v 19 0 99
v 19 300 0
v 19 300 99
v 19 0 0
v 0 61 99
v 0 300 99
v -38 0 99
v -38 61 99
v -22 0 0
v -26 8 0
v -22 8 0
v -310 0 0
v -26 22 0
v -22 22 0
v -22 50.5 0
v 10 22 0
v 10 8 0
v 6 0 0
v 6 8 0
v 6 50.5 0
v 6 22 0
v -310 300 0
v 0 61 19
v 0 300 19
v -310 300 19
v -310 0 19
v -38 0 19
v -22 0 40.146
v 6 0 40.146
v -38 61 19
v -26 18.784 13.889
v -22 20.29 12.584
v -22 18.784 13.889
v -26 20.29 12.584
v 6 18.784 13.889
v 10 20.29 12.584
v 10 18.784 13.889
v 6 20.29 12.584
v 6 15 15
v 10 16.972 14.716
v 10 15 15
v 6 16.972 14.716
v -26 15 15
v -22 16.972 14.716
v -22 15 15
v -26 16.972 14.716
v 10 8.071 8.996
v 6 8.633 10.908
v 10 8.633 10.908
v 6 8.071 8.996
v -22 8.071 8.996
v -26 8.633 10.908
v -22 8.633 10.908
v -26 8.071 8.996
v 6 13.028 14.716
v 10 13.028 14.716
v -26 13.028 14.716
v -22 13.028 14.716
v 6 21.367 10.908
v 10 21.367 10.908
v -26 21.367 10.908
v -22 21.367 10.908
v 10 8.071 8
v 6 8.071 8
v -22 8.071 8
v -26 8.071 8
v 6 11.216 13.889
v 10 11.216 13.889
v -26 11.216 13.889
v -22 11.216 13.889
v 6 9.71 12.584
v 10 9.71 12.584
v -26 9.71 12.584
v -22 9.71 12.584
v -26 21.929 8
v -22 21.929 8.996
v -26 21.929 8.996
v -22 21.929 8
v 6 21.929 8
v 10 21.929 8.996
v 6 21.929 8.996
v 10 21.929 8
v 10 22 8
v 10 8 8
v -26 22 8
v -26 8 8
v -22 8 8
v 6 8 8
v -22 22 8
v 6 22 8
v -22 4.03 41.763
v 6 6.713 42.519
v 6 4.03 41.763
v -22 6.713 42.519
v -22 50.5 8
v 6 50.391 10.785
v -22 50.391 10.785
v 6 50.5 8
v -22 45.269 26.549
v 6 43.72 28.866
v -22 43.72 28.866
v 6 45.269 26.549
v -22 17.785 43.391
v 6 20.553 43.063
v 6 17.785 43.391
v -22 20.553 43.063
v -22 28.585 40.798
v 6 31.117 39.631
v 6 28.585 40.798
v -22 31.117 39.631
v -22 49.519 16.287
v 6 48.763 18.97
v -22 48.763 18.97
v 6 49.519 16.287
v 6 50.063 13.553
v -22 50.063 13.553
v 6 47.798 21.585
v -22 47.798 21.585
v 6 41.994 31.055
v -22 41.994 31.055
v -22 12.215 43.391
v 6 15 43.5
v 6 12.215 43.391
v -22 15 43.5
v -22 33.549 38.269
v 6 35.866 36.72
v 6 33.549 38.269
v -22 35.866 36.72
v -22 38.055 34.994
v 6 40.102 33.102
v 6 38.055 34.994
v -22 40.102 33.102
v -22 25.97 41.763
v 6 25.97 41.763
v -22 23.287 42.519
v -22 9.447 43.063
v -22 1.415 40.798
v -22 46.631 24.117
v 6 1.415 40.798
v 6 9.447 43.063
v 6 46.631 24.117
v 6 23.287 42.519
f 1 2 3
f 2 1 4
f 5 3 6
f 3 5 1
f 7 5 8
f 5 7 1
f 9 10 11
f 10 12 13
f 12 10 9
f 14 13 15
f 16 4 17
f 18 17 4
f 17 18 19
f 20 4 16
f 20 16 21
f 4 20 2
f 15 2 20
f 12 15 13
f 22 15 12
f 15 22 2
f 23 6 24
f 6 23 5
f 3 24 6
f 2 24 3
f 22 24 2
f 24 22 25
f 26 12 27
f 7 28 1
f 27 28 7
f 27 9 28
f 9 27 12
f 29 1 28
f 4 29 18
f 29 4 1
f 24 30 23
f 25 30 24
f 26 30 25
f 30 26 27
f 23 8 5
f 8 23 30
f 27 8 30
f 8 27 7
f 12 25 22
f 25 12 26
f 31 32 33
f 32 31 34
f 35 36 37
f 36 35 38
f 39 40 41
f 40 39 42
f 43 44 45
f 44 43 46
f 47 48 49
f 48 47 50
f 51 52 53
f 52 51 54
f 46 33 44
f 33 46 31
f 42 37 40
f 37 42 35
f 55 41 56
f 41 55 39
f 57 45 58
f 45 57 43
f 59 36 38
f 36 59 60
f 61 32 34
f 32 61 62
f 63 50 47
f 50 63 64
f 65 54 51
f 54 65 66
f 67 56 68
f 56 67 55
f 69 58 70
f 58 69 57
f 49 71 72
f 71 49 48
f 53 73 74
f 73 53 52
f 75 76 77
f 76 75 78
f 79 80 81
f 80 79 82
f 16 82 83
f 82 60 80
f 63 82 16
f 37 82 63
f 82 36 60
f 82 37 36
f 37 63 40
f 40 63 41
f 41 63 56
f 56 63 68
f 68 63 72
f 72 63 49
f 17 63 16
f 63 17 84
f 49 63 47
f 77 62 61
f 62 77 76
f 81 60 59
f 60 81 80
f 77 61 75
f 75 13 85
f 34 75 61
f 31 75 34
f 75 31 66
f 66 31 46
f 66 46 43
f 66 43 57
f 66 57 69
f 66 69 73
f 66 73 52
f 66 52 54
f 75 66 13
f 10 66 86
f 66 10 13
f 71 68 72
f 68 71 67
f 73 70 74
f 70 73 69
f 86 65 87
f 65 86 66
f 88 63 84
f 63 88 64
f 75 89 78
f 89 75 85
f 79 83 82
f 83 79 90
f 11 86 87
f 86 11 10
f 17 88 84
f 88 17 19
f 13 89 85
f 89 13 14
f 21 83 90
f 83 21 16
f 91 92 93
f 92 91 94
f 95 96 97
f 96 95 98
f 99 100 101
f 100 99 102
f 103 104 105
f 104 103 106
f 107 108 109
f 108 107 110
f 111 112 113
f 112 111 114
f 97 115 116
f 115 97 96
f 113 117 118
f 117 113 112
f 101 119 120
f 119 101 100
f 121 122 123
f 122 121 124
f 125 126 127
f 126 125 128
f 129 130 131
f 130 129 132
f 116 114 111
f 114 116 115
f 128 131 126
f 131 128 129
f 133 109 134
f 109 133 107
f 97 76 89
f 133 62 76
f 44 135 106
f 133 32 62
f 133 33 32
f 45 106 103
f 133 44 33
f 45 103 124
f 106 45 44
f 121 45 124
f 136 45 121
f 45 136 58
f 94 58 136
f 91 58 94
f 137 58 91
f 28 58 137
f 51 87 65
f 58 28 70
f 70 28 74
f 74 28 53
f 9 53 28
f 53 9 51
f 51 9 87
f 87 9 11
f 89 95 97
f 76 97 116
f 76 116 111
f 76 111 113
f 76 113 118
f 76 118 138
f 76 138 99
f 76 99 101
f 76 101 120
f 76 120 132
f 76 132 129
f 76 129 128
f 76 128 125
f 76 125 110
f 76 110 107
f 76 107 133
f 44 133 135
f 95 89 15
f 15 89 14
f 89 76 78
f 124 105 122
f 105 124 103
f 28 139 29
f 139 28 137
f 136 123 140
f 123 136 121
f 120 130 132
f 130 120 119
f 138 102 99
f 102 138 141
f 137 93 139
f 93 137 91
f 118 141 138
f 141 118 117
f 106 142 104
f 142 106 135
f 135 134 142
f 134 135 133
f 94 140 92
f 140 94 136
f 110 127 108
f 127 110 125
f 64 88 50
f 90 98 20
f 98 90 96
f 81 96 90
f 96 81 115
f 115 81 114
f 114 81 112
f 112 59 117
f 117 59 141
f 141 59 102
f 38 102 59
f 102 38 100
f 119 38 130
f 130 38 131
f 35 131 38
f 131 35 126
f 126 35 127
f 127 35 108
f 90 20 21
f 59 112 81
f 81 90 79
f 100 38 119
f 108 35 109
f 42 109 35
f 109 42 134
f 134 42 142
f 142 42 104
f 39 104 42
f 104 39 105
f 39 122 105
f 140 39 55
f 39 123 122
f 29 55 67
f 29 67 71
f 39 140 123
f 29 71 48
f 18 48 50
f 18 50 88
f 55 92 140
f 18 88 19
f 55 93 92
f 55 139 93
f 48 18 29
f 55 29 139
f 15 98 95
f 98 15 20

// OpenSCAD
//cutout for wheel

translate([0,0,19])difference(){
    union(){
        //MDF vertical
        translate([0,0,-19])cube([19,300,80+19]);
        translate([-19,0,0])cube([19,61,80]);
        translate([-19*2,0,0])cube([19,61,80]);
        //MDF boden
        translate([-310,0,-19])cube([310,300,19]);
    }
    translate([6,15,-11])wheelcutout();
}

module wheelcutout(){
rotate([-90,90,90]){
    difference(){
        union(){
            cylinder(r=35.5,h=6+3+19,$fn=80);
            translate([0,0,-4]){
                cylinder(r=7,h=6+3+19+8);
                translate([0,-7,0])cube([50,14,6+3+19+8]);
            }
            translate([0,-35.5,0])cube([35.5,35.5,6+3+19]);
        }
    translate([9,-50,-50])cube([50,100,100]);
    translate([-50,16,-10])cube([100,100,50]);
    }
}
}
